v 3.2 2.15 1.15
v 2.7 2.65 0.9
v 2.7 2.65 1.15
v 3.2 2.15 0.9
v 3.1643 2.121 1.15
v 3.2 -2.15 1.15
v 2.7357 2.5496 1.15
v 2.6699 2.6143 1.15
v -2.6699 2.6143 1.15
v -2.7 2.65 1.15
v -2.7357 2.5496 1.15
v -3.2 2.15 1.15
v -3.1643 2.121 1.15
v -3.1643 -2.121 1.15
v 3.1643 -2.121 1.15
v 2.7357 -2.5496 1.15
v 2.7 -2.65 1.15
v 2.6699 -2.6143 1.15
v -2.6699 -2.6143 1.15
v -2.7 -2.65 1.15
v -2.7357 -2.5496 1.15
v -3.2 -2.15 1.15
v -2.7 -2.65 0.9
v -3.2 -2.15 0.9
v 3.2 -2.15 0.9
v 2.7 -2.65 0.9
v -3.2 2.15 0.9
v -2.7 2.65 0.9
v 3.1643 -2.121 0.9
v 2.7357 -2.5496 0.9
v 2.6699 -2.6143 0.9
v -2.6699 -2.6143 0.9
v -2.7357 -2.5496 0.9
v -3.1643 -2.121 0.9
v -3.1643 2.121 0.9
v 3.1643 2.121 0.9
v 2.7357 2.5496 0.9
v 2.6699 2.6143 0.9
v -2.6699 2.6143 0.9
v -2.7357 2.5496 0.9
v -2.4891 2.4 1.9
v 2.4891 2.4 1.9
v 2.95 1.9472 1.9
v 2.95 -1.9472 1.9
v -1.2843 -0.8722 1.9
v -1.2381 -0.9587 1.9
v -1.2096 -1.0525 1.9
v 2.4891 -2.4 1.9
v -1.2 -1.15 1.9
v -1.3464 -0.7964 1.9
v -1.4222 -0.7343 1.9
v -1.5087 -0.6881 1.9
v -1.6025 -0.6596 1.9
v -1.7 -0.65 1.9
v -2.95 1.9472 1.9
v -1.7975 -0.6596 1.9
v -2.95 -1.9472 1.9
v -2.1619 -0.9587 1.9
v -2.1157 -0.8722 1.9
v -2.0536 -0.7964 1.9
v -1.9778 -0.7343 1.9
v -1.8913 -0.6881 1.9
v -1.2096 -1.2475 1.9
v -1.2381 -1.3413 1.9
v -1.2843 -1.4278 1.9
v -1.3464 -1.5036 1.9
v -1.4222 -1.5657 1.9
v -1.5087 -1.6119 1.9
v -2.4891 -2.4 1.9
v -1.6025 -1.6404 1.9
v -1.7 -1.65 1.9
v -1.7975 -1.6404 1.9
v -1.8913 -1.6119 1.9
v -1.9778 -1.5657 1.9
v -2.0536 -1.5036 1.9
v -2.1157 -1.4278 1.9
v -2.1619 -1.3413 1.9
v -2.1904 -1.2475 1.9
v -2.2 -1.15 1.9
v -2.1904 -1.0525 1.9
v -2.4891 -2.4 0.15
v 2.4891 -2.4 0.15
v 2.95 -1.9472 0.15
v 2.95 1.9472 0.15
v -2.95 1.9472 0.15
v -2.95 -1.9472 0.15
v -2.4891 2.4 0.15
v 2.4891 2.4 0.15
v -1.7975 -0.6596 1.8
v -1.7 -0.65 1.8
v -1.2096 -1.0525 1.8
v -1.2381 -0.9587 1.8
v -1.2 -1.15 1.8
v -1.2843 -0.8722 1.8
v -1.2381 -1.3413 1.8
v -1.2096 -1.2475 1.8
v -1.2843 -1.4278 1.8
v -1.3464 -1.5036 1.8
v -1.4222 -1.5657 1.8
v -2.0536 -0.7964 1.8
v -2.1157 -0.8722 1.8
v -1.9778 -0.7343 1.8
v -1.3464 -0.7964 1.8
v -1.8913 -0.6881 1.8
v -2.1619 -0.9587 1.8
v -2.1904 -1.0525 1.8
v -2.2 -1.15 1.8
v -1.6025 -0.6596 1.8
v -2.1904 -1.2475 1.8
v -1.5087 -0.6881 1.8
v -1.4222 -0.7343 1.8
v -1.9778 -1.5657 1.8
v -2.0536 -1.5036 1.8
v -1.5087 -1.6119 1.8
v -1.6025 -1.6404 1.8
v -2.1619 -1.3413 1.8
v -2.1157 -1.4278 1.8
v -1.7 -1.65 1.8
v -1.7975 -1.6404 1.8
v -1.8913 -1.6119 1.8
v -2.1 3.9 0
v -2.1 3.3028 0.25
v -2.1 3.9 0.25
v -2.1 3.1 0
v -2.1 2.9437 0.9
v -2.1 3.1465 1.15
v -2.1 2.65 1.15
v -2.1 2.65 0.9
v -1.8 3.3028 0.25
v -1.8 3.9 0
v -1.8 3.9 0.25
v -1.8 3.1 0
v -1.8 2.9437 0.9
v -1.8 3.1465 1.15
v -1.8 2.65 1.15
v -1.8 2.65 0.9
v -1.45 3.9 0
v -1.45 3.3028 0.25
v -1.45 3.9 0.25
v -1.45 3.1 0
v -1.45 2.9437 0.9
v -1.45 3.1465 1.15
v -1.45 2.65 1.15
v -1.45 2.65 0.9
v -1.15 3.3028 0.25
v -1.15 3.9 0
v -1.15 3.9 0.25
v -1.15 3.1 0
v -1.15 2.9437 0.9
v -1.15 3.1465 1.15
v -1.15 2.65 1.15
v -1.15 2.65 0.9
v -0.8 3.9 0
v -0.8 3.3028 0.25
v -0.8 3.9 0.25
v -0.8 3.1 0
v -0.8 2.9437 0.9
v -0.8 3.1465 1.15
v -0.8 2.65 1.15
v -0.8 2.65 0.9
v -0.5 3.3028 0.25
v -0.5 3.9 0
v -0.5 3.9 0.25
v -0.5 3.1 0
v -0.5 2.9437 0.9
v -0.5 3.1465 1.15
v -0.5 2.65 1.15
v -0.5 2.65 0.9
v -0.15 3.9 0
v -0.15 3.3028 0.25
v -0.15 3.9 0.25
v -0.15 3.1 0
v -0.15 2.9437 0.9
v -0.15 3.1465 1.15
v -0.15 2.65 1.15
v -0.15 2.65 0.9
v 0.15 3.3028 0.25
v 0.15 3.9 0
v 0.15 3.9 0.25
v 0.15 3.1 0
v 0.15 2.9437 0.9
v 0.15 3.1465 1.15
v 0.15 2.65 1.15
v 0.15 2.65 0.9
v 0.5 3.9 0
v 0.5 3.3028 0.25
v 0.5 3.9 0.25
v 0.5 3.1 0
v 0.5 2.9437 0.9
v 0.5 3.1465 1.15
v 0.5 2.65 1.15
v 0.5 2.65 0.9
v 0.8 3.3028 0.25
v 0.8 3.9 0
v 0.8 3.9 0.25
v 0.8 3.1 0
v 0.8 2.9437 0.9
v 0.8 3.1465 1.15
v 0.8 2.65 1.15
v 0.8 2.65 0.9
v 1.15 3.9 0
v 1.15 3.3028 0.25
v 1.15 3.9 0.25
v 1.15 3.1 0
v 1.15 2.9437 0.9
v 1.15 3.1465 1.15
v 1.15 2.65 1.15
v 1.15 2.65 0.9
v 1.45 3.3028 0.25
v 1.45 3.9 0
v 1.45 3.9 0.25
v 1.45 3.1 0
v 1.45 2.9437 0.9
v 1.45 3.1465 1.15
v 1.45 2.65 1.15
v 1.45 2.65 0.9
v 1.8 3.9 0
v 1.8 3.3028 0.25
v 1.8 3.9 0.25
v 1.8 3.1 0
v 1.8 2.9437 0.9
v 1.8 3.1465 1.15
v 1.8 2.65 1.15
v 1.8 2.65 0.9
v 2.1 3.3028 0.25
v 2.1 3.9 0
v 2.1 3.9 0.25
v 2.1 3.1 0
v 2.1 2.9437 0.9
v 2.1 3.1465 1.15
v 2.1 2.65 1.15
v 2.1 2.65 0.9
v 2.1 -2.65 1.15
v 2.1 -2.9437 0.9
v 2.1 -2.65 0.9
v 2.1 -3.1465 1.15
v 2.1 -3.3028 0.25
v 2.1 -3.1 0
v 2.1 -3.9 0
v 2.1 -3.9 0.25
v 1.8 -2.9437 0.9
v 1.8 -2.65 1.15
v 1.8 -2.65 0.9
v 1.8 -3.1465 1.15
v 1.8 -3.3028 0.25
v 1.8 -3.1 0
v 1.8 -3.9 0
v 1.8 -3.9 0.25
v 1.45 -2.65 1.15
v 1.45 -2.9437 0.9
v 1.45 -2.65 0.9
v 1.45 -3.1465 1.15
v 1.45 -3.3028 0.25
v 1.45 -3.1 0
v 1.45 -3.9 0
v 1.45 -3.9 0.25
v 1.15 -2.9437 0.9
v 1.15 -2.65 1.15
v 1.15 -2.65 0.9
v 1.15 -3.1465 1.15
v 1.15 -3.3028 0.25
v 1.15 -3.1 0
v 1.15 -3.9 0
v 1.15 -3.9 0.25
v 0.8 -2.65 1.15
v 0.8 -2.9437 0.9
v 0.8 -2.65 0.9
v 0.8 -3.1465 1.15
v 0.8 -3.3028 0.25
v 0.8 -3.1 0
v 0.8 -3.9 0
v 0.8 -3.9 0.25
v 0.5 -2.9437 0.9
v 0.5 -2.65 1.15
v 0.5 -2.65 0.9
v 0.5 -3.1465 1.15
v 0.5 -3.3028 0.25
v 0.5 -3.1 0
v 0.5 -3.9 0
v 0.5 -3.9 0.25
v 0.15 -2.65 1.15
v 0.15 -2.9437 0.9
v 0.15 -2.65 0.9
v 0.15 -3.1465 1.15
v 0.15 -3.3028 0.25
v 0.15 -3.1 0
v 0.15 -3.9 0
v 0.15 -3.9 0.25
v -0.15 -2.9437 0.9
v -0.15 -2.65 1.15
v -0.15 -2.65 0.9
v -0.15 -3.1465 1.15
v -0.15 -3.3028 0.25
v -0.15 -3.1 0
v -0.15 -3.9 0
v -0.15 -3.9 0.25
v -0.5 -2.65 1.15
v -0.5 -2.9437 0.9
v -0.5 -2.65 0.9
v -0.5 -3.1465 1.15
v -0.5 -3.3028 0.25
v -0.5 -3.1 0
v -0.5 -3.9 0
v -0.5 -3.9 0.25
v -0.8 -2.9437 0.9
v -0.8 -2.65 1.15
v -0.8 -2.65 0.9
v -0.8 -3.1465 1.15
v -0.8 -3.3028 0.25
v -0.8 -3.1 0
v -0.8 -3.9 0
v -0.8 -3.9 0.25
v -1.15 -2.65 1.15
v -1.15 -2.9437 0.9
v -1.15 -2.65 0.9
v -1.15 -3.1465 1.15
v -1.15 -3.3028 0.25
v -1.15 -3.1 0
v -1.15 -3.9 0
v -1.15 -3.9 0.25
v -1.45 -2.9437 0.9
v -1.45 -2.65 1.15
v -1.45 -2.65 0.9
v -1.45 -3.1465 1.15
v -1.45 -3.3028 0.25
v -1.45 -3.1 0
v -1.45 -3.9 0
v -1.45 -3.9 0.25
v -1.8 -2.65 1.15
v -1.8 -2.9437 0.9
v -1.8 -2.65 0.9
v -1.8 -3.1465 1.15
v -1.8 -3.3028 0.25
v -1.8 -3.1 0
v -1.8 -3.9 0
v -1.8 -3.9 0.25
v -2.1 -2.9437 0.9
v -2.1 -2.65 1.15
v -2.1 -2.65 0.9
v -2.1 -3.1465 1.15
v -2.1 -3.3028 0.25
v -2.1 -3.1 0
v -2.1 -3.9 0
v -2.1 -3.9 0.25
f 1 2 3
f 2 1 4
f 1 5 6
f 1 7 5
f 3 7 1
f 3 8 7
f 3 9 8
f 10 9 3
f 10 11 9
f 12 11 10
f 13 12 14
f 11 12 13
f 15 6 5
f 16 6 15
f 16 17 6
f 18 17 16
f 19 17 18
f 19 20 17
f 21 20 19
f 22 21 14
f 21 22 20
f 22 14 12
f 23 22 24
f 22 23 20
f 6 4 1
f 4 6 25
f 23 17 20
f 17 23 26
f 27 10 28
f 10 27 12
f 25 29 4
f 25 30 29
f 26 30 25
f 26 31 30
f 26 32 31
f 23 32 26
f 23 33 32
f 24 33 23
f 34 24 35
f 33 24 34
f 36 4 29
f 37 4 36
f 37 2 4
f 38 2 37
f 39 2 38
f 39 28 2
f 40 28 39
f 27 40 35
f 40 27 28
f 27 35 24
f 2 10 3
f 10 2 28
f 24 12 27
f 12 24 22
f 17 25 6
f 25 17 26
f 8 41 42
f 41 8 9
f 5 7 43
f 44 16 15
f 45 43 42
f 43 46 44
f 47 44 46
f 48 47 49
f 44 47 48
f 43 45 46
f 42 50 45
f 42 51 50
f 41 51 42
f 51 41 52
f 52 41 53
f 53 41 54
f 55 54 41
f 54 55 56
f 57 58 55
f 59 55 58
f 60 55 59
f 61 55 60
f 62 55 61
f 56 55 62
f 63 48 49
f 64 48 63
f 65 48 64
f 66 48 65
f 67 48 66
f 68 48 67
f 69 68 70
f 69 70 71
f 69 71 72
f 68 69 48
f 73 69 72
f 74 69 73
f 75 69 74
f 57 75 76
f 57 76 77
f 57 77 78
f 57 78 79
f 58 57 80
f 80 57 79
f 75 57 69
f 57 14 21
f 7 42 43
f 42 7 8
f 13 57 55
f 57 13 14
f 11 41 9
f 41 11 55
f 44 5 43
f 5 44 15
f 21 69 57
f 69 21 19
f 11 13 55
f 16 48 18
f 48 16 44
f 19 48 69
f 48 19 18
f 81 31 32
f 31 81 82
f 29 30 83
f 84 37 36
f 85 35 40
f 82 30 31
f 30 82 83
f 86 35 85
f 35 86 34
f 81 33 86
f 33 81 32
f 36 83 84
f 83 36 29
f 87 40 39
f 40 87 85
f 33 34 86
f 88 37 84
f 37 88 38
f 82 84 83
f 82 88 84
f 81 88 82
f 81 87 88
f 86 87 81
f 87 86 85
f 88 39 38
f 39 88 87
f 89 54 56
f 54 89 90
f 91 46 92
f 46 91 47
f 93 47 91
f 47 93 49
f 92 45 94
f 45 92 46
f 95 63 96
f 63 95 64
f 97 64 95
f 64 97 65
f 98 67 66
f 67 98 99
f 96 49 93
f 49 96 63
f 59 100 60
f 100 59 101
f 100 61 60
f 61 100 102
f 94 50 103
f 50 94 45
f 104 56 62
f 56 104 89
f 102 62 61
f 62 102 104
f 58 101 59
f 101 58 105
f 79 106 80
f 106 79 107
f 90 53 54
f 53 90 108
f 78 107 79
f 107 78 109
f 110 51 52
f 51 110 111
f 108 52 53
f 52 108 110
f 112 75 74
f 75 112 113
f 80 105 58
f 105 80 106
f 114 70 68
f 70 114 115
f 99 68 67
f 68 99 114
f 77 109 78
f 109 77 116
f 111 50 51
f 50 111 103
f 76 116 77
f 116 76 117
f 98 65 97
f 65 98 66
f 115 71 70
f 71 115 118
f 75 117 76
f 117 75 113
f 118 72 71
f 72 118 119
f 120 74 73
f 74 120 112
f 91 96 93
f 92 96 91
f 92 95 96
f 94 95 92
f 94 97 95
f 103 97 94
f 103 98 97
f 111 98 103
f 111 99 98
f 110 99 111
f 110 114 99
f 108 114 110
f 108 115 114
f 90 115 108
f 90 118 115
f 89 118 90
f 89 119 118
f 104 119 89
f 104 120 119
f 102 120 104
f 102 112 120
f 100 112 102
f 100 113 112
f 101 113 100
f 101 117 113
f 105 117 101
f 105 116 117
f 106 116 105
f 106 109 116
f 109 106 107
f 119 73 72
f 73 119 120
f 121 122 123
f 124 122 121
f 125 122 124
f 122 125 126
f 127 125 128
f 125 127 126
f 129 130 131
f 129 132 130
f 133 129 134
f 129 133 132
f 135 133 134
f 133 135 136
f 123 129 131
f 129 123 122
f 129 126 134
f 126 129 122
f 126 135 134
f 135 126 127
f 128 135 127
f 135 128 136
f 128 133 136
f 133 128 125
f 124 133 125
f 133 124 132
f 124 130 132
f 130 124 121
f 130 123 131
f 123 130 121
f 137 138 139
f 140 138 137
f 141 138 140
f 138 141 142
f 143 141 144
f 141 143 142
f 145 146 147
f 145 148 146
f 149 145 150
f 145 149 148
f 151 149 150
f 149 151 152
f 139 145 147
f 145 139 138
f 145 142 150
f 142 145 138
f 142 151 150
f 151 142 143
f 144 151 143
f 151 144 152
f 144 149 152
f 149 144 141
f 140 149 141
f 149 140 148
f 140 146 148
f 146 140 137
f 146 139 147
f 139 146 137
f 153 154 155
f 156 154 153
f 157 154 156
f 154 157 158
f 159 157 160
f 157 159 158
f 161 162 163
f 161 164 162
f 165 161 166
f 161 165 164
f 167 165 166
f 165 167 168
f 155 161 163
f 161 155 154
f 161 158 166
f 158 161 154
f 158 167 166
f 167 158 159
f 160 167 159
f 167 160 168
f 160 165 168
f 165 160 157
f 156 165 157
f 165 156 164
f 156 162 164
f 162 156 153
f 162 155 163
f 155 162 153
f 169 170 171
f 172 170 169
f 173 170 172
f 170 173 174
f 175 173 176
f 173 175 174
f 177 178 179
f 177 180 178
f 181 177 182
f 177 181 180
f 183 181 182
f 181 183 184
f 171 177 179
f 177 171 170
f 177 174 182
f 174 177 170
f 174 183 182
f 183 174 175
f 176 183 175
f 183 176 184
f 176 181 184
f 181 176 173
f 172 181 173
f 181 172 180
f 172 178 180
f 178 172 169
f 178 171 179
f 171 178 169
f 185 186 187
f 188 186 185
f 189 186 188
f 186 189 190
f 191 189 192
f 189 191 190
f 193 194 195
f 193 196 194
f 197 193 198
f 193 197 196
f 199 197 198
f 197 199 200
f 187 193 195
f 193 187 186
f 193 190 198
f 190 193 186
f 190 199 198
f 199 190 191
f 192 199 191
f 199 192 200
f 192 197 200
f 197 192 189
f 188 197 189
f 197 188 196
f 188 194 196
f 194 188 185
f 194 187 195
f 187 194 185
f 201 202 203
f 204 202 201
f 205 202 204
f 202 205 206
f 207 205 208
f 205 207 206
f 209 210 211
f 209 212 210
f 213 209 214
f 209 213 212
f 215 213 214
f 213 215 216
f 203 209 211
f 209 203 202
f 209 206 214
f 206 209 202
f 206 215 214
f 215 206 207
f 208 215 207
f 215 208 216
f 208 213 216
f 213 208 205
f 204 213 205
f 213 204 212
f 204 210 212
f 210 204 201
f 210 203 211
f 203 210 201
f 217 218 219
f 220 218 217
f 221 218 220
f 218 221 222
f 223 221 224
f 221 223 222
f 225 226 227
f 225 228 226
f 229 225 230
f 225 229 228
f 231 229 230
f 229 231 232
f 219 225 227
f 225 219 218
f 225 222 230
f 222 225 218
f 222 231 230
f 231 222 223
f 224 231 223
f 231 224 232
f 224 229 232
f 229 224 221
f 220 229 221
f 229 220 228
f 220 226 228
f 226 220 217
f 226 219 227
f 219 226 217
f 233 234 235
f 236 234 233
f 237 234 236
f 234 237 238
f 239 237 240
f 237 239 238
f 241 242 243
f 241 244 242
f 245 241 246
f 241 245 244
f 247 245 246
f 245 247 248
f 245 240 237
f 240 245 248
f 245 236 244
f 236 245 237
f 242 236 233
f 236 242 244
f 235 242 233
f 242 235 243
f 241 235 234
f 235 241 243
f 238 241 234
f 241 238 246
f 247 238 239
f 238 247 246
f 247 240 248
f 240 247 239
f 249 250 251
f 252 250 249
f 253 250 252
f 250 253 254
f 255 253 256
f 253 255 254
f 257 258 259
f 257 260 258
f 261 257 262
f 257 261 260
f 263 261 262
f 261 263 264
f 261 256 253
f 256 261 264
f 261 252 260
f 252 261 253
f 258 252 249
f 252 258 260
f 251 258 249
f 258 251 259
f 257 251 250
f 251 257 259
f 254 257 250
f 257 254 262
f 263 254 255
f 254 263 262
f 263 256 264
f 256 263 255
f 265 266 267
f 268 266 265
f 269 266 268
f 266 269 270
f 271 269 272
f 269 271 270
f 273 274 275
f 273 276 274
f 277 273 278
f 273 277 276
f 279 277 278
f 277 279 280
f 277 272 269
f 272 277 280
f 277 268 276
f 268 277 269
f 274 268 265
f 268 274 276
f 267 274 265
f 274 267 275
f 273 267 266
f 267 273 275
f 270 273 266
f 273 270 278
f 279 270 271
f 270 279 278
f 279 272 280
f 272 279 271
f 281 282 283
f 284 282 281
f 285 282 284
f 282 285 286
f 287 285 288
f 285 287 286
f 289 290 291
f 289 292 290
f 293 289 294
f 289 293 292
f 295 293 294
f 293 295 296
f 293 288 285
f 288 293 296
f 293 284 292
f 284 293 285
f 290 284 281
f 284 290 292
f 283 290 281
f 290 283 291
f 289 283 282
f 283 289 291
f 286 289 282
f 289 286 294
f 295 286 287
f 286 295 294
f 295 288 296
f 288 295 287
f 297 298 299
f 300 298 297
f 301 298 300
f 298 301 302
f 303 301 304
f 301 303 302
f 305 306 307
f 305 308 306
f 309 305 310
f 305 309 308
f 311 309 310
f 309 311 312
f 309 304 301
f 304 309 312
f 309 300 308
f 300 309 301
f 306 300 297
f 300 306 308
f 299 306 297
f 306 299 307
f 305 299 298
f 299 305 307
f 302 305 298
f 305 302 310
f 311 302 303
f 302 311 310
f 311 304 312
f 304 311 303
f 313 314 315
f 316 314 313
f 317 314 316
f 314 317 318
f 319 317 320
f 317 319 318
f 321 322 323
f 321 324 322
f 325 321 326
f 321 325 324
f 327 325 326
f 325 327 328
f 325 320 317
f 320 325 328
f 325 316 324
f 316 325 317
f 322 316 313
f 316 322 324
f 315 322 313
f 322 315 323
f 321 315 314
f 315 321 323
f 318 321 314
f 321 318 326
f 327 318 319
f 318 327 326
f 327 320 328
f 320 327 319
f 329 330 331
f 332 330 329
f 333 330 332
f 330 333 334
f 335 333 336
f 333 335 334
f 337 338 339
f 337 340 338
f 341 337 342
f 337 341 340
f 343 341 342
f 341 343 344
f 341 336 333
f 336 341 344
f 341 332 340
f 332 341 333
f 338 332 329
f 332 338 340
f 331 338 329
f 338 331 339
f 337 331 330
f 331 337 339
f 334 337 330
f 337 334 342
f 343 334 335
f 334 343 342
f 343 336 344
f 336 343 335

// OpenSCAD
pins = 14;
pin_pitch = 0.65;
pin_width = 0.3;
pin_seating = 0.8;
pin_gull_angle = 10;
leadframe_thickness = 0.25;

overall_width = 7.8;
body_width = 5.3;
body_length = 6.4;
body_thickness = 1.75;

total_thickness = 1.9;

body_length_bevel = 0.5;
body_width_bevel = 0.5;
body_chamfer = 0.5;


leadframe_height = total_thickness - body_thickness/2;

index_mark_offset = min(min(body_width, body_length) * 0.4, 1.5);
index_mark_radius = min(index_mark_offset / 3, 0.5);


difference() {
    body();
    color("#ddd") translate([
        -body_length / 2 + index_mark_offset,
        -body_width / 2 + index_mark_offset,
        total_thickness - 0.1,
    ]) cylinder(h = 10, r = index_mark_radius, $fn=32);
}


translate([pin_pitch * ((pins / 2) - 1) / -2, overall_width / 2, 0]) for(n = [0 : pins / 2 - 1]) {
    translate([pin_pitch * n, 0, 0]) pin();
}
rotate([0, 0, 180]) translate([pin_pitch * ((pins / 2) - 1) / -2, overall_width / 2, 0]) for(n = [0 : pins / 2 - 1]) {
    translate([pin_pitch * n, 0, 0]) pin();
}


module pin() {
    color("#999") rotate([90, 0, 90]) linear_extrude(height = pin_width, center = true) {
        gull_offset = leadframe_height - leadframe_thickness / 2;
        pin_length = (overall_width - body_width) / 2;
        sine = sin(pin_gull_angle);
        cosine = cos(pin_gull_angle);
        polygon([
            [0, 0],
            [-pin_seating, 0],
            [-pin_seating - sine * gull_offset, gull_offset],
            [-pin_length, gull_offset],
            [-pin_length, gull_offset + leadframe_thickness],
            [-pin_seating - sine * (gull_offset + leadframe_thickness) + cosine * leadframe_thickness, gull_offset + leadframe_thickness],
            [-pin_seating - sine * leadframe_thickness + cosine * leadframe_thickness, leadframe_thickness],
            [0, leadframe_thickness],
        ]);
    }
}


module body() {
    color("#555") translate([0, 0, leadframe_height]) {
        linear_extrude(height = leadframe_thickness, center = true) body_outline();
        linear_extrude(
            height = body_thickness / 2,
            scale = [(body_length - body_length_bevel) / body_length, (body_width - body_width_bevel) / body_width]
        ) body_outline();
        
        rotate([180, 0, 0]) linear_extrude(
            height = body_thickness / 2,
            scale = [(body_length - body_length_bevel) / body_length, (body_width - body_width_bevel) / body_width]
        ) body_outline();
    }
}
module body_outline() {
    polygon([
        [ -body_length/2 + body_chamfer, -body_width/2 ],
        [ -body_length/2               , -body_width/2 + body_chamfer ],
        [ -body_length/2               , +body_width/2 - body_chamfer ],
        [ -body_length/2 + body_chamfer, +body_width/2 ],
        [ +body_length/2 - body_chamfer, +body_width/2 ],
        [ +body_length/2               , +body_width/2 - body_chamfer ],
        [ +body_length/2               , -body_width/2 + body_chamfer ],
        [ +body_length/2 - body_chamfer, -body_width/2 ],
    ]);
}
